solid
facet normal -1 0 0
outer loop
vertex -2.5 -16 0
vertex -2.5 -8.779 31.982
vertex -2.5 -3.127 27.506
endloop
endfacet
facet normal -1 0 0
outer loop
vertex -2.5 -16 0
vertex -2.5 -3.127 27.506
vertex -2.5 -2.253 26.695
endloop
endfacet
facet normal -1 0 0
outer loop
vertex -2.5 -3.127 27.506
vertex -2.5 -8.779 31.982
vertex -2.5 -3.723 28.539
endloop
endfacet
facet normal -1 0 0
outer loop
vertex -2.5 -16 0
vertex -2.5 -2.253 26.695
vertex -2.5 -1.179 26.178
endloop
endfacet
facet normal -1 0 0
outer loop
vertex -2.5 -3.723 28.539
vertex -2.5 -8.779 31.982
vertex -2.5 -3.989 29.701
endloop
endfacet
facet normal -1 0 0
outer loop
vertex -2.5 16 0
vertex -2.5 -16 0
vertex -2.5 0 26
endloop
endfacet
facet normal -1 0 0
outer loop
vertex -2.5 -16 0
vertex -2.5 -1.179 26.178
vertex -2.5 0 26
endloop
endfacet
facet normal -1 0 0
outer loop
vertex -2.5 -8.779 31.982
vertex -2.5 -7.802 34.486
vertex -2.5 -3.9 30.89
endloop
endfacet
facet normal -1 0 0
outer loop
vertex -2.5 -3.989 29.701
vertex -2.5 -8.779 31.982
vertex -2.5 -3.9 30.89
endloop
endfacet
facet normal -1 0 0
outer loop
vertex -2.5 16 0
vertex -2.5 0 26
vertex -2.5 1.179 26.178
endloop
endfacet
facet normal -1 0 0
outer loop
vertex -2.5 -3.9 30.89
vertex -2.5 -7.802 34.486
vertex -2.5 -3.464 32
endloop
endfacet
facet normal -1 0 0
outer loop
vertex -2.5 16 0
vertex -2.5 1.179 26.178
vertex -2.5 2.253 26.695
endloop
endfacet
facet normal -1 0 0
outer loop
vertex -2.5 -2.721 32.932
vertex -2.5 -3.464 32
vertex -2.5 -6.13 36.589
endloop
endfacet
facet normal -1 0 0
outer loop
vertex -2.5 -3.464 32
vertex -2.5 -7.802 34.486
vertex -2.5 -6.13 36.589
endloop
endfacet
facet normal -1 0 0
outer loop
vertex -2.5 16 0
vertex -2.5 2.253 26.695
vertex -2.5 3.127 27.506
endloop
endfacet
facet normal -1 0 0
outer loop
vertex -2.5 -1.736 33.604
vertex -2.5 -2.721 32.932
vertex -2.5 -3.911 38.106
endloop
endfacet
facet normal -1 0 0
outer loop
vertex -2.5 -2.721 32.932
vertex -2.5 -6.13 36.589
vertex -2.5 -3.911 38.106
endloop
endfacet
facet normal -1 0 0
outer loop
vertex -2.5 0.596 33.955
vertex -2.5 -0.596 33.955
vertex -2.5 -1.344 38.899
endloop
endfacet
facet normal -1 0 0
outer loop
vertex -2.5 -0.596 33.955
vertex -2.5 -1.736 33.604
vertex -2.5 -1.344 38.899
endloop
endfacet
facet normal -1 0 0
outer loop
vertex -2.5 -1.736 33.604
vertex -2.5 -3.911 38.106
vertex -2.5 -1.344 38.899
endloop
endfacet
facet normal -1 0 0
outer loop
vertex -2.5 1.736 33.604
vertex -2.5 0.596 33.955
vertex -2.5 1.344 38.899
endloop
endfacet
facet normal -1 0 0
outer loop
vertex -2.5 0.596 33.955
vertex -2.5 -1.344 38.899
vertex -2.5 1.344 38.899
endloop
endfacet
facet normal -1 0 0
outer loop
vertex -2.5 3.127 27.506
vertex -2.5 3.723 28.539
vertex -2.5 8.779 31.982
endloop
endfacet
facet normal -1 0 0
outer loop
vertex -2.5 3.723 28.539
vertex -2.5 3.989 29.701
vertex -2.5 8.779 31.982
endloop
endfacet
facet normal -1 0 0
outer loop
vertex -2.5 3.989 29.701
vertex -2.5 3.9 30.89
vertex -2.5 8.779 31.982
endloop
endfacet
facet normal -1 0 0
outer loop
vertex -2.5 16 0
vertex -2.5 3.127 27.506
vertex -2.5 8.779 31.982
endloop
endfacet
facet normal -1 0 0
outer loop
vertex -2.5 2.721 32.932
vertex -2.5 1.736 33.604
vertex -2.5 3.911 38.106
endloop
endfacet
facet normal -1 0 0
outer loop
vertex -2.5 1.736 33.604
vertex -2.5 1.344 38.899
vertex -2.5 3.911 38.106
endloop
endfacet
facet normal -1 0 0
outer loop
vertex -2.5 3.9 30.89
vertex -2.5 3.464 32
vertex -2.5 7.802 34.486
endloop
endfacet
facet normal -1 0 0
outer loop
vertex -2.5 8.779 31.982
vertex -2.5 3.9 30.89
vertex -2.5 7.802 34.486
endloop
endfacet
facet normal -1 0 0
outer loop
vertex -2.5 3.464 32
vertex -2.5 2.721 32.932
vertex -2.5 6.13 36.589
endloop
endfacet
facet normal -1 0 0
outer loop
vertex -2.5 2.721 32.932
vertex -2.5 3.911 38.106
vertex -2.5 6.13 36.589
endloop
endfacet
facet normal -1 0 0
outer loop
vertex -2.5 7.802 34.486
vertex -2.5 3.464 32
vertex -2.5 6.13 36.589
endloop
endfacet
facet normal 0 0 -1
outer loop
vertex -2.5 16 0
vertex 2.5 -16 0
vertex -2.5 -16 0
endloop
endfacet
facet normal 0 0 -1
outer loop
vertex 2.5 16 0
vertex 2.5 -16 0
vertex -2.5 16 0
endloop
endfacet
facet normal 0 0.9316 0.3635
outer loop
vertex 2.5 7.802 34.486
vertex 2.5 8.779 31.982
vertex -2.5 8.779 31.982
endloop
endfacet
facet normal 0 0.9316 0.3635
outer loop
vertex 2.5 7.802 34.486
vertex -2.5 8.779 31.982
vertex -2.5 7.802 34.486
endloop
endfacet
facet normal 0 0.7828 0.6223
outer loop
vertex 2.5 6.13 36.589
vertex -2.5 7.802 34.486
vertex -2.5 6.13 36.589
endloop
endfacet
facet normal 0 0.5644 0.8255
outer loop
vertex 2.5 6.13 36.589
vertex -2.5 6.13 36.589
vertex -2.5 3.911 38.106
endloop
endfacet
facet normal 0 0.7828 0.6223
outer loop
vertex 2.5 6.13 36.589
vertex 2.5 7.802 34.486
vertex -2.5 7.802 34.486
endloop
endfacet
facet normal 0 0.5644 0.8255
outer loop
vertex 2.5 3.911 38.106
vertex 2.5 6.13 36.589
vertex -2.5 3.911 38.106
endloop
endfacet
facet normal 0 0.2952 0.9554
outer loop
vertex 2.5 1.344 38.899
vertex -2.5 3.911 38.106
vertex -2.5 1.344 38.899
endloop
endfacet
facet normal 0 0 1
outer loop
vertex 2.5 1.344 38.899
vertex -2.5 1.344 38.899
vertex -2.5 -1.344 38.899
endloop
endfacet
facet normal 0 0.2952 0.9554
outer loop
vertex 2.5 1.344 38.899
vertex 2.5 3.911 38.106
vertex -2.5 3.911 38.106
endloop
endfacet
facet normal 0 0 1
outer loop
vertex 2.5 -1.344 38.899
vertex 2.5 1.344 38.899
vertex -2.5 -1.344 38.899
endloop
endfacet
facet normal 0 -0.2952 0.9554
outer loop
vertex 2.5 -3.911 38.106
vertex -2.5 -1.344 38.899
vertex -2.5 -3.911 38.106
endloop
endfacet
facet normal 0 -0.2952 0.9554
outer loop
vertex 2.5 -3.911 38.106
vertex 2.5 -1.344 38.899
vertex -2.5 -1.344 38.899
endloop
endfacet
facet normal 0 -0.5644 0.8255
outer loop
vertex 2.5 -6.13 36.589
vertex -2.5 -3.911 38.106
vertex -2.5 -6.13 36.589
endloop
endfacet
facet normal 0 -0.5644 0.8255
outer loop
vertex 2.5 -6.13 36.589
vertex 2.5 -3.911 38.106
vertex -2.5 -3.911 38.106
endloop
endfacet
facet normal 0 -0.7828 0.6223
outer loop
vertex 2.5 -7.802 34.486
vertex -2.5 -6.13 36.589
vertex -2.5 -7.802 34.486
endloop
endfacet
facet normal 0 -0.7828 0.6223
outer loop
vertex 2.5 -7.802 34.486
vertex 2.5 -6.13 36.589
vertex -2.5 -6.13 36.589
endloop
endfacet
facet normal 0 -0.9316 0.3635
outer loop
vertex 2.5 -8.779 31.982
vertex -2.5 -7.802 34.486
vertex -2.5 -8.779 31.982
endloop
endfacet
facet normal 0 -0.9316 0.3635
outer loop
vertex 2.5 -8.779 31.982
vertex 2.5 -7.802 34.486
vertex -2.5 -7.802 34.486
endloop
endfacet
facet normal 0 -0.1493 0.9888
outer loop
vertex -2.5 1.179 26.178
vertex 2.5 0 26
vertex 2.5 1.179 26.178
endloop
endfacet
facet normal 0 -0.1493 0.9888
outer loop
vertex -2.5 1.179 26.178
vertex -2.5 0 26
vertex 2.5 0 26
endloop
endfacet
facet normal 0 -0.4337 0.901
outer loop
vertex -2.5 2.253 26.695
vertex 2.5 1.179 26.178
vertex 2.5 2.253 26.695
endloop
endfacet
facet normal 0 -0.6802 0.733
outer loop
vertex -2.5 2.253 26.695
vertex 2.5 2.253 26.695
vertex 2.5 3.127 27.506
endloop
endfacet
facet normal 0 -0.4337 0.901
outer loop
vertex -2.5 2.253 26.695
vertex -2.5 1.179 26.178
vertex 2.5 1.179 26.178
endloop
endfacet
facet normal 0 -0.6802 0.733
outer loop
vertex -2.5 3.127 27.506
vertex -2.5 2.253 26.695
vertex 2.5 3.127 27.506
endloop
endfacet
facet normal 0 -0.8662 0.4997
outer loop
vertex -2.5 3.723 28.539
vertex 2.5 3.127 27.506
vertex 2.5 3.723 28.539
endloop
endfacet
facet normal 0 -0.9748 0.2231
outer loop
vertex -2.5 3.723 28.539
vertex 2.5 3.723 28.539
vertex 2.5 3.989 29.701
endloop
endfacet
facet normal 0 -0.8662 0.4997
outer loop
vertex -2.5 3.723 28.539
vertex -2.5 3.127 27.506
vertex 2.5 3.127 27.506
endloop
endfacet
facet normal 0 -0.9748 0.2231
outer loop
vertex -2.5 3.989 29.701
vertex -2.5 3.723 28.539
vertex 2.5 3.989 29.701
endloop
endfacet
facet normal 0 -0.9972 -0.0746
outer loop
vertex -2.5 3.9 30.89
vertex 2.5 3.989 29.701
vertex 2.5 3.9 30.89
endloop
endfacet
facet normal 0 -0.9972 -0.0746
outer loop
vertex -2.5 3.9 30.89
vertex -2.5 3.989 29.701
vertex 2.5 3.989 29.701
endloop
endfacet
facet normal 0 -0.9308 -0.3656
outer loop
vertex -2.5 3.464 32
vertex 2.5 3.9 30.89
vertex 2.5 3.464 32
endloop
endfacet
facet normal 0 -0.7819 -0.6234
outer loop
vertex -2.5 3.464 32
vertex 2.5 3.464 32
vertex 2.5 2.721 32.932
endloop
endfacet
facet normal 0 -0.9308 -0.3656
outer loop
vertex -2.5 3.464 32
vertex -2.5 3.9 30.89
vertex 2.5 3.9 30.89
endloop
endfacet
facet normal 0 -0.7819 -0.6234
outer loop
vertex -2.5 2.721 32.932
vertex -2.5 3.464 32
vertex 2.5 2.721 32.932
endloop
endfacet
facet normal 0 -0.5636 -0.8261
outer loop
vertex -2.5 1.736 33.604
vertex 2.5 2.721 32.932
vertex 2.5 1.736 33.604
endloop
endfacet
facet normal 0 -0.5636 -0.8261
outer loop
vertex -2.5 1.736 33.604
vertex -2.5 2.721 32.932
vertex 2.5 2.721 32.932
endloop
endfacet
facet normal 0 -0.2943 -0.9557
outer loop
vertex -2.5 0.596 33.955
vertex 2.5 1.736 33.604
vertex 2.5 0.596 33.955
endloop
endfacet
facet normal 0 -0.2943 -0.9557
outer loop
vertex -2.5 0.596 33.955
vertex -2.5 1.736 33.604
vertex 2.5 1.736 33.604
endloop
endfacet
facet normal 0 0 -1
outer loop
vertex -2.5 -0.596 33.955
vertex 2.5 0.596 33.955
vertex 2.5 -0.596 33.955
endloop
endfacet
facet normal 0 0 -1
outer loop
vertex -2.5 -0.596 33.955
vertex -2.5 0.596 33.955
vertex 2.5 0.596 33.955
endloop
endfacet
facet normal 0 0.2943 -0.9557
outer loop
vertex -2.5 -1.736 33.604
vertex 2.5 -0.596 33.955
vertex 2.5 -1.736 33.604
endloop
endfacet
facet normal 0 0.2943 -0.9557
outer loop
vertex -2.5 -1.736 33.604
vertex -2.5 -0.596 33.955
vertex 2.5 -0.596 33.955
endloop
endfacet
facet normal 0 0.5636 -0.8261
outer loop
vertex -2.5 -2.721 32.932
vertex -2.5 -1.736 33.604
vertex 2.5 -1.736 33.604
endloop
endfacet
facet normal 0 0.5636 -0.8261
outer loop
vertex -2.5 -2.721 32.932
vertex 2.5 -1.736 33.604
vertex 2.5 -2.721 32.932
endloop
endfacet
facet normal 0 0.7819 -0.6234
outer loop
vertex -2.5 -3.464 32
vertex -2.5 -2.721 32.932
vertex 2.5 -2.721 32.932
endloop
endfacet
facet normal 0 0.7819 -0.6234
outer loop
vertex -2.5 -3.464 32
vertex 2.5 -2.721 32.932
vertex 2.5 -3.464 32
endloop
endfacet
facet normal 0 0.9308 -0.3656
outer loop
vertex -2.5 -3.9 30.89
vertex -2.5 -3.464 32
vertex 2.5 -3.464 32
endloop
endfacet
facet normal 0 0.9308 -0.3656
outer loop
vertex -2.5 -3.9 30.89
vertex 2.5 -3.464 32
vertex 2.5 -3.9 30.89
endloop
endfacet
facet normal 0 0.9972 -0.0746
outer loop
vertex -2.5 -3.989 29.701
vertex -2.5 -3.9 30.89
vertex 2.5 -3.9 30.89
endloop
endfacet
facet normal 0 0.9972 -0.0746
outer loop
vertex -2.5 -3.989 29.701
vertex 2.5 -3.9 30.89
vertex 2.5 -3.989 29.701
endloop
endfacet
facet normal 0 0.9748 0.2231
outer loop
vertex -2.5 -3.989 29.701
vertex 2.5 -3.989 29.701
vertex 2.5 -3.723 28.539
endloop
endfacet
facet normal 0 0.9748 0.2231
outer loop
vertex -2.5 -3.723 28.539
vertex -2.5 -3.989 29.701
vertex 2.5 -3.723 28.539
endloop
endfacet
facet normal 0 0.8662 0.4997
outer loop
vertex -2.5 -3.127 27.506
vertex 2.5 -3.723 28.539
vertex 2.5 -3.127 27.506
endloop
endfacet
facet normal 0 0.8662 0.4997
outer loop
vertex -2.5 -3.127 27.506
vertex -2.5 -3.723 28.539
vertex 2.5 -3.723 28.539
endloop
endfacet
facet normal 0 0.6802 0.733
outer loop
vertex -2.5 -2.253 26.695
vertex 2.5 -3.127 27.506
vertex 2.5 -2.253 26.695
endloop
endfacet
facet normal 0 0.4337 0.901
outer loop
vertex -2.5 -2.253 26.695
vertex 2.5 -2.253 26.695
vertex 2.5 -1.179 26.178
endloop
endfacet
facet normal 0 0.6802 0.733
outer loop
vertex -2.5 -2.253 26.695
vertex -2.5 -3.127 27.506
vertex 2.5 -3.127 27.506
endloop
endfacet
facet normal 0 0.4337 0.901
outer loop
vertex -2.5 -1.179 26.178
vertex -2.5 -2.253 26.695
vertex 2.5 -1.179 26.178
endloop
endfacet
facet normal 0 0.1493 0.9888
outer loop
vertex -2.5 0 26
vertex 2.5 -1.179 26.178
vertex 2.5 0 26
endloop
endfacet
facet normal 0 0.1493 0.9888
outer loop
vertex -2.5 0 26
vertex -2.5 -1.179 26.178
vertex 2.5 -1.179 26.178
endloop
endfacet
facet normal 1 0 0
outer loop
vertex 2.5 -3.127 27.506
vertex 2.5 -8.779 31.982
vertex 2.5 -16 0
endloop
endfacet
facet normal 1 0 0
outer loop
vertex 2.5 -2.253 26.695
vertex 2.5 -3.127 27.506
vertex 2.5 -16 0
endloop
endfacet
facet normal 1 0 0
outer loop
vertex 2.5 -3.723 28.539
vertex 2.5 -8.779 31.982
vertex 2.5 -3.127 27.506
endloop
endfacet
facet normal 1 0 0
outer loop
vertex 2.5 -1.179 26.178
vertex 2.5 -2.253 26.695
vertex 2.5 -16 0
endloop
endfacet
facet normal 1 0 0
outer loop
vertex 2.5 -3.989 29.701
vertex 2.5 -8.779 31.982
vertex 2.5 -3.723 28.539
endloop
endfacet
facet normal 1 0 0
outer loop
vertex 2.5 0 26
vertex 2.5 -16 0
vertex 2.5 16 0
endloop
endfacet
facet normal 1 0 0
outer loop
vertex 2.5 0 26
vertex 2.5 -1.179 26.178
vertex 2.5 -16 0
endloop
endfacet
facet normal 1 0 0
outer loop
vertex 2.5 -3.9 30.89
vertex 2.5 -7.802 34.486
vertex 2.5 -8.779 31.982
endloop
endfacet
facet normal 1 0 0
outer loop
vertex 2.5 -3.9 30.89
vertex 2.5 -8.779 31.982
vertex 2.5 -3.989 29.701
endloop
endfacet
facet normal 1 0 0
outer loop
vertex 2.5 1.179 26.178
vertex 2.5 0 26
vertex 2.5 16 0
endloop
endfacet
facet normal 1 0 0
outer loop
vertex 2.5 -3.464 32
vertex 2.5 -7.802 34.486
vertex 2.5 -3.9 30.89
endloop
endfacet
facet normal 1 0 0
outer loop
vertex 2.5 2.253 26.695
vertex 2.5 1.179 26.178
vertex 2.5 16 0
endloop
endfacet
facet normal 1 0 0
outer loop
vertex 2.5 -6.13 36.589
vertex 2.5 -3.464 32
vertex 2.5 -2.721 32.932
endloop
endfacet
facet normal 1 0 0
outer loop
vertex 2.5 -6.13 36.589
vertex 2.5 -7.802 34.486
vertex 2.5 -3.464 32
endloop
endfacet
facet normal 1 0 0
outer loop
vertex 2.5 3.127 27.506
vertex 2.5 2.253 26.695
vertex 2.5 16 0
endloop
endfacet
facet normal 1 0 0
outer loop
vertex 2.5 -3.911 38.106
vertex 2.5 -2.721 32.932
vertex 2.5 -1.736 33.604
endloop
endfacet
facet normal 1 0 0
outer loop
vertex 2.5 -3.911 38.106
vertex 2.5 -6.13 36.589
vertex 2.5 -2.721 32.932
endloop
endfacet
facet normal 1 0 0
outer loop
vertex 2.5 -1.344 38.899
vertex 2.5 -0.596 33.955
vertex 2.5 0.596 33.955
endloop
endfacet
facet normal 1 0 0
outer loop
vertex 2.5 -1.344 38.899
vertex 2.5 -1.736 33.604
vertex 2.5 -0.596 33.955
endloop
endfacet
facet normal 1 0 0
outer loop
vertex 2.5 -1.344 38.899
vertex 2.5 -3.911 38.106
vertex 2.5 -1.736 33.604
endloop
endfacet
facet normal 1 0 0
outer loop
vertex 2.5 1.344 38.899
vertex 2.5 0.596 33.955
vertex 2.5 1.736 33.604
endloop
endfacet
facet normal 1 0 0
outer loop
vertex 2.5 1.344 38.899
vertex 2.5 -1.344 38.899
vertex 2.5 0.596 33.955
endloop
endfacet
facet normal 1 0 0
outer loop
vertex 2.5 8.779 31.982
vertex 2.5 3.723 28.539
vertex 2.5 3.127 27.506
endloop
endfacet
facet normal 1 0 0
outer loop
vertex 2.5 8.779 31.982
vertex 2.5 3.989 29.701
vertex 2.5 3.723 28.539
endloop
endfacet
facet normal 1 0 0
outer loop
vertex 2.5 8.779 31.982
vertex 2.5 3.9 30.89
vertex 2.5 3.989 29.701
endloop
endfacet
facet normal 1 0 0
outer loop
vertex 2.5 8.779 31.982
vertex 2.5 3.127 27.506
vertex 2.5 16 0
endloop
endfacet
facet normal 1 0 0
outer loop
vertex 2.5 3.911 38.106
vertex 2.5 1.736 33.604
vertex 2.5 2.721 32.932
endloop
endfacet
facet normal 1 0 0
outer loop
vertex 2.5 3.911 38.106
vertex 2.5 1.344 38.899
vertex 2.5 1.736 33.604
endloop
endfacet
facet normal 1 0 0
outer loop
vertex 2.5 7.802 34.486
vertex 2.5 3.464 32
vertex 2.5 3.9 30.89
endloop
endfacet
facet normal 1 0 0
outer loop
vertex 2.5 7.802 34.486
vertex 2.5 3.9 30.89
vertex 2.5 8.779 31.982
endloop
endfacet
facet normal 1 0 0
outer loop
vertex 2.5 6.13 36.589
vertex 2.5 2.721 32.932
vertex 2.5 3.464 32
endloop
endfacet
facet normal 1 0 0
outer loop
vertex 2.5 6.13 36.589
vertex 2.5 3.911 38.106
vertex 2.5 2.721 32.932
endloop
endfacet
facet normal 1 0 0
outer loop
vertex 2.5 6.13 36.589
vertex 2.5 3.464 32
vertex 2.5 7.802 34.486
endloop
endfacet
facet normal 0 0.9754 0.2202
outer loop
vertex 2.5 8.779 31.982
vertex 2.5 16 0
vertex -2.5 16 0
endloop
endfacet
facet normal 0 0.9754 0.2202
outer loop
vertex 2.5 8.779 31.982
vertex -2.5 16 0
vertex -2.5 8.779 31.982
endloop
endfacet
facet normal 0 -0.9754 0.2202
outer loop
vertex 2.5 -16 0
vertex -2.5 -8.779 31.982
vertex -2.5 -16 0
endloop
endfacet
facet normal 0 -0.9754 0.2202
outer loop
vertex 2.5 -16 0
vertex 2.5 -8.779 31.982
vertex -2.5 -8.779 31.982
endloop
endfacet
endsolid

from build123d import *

# Parameters (mm, degrees)
SKETCH1_R           = 4
BOSS_EXTRUDE1_DEPTH = 2.5


with BuildPart() as part:
    # Sketch1 → Boss-Extrude1 (new, symmetric)
    with BuildSketch(Plane.YZ):
        with BuildLine():
            Line((-16, 0), (16, 0))
            Line((16, 0), (8.779015578, 31.982141641))
            ThreePointArc((8.779015578, 31.982141641), (0, 39), (-8.779015578, 31.982141641))
            Line((-8.779015578, 31.982141641), (-16, 0))
        make_face()
        with Locations(Location((0, 30, 0), (0, 0, 270))):
            Circle(SKETCH1_R, mode=Mode.SUBTRACT)
    extrude(amount=BOSS_EXTRUDE1_DEPTH, both=True)


solid = part.part
